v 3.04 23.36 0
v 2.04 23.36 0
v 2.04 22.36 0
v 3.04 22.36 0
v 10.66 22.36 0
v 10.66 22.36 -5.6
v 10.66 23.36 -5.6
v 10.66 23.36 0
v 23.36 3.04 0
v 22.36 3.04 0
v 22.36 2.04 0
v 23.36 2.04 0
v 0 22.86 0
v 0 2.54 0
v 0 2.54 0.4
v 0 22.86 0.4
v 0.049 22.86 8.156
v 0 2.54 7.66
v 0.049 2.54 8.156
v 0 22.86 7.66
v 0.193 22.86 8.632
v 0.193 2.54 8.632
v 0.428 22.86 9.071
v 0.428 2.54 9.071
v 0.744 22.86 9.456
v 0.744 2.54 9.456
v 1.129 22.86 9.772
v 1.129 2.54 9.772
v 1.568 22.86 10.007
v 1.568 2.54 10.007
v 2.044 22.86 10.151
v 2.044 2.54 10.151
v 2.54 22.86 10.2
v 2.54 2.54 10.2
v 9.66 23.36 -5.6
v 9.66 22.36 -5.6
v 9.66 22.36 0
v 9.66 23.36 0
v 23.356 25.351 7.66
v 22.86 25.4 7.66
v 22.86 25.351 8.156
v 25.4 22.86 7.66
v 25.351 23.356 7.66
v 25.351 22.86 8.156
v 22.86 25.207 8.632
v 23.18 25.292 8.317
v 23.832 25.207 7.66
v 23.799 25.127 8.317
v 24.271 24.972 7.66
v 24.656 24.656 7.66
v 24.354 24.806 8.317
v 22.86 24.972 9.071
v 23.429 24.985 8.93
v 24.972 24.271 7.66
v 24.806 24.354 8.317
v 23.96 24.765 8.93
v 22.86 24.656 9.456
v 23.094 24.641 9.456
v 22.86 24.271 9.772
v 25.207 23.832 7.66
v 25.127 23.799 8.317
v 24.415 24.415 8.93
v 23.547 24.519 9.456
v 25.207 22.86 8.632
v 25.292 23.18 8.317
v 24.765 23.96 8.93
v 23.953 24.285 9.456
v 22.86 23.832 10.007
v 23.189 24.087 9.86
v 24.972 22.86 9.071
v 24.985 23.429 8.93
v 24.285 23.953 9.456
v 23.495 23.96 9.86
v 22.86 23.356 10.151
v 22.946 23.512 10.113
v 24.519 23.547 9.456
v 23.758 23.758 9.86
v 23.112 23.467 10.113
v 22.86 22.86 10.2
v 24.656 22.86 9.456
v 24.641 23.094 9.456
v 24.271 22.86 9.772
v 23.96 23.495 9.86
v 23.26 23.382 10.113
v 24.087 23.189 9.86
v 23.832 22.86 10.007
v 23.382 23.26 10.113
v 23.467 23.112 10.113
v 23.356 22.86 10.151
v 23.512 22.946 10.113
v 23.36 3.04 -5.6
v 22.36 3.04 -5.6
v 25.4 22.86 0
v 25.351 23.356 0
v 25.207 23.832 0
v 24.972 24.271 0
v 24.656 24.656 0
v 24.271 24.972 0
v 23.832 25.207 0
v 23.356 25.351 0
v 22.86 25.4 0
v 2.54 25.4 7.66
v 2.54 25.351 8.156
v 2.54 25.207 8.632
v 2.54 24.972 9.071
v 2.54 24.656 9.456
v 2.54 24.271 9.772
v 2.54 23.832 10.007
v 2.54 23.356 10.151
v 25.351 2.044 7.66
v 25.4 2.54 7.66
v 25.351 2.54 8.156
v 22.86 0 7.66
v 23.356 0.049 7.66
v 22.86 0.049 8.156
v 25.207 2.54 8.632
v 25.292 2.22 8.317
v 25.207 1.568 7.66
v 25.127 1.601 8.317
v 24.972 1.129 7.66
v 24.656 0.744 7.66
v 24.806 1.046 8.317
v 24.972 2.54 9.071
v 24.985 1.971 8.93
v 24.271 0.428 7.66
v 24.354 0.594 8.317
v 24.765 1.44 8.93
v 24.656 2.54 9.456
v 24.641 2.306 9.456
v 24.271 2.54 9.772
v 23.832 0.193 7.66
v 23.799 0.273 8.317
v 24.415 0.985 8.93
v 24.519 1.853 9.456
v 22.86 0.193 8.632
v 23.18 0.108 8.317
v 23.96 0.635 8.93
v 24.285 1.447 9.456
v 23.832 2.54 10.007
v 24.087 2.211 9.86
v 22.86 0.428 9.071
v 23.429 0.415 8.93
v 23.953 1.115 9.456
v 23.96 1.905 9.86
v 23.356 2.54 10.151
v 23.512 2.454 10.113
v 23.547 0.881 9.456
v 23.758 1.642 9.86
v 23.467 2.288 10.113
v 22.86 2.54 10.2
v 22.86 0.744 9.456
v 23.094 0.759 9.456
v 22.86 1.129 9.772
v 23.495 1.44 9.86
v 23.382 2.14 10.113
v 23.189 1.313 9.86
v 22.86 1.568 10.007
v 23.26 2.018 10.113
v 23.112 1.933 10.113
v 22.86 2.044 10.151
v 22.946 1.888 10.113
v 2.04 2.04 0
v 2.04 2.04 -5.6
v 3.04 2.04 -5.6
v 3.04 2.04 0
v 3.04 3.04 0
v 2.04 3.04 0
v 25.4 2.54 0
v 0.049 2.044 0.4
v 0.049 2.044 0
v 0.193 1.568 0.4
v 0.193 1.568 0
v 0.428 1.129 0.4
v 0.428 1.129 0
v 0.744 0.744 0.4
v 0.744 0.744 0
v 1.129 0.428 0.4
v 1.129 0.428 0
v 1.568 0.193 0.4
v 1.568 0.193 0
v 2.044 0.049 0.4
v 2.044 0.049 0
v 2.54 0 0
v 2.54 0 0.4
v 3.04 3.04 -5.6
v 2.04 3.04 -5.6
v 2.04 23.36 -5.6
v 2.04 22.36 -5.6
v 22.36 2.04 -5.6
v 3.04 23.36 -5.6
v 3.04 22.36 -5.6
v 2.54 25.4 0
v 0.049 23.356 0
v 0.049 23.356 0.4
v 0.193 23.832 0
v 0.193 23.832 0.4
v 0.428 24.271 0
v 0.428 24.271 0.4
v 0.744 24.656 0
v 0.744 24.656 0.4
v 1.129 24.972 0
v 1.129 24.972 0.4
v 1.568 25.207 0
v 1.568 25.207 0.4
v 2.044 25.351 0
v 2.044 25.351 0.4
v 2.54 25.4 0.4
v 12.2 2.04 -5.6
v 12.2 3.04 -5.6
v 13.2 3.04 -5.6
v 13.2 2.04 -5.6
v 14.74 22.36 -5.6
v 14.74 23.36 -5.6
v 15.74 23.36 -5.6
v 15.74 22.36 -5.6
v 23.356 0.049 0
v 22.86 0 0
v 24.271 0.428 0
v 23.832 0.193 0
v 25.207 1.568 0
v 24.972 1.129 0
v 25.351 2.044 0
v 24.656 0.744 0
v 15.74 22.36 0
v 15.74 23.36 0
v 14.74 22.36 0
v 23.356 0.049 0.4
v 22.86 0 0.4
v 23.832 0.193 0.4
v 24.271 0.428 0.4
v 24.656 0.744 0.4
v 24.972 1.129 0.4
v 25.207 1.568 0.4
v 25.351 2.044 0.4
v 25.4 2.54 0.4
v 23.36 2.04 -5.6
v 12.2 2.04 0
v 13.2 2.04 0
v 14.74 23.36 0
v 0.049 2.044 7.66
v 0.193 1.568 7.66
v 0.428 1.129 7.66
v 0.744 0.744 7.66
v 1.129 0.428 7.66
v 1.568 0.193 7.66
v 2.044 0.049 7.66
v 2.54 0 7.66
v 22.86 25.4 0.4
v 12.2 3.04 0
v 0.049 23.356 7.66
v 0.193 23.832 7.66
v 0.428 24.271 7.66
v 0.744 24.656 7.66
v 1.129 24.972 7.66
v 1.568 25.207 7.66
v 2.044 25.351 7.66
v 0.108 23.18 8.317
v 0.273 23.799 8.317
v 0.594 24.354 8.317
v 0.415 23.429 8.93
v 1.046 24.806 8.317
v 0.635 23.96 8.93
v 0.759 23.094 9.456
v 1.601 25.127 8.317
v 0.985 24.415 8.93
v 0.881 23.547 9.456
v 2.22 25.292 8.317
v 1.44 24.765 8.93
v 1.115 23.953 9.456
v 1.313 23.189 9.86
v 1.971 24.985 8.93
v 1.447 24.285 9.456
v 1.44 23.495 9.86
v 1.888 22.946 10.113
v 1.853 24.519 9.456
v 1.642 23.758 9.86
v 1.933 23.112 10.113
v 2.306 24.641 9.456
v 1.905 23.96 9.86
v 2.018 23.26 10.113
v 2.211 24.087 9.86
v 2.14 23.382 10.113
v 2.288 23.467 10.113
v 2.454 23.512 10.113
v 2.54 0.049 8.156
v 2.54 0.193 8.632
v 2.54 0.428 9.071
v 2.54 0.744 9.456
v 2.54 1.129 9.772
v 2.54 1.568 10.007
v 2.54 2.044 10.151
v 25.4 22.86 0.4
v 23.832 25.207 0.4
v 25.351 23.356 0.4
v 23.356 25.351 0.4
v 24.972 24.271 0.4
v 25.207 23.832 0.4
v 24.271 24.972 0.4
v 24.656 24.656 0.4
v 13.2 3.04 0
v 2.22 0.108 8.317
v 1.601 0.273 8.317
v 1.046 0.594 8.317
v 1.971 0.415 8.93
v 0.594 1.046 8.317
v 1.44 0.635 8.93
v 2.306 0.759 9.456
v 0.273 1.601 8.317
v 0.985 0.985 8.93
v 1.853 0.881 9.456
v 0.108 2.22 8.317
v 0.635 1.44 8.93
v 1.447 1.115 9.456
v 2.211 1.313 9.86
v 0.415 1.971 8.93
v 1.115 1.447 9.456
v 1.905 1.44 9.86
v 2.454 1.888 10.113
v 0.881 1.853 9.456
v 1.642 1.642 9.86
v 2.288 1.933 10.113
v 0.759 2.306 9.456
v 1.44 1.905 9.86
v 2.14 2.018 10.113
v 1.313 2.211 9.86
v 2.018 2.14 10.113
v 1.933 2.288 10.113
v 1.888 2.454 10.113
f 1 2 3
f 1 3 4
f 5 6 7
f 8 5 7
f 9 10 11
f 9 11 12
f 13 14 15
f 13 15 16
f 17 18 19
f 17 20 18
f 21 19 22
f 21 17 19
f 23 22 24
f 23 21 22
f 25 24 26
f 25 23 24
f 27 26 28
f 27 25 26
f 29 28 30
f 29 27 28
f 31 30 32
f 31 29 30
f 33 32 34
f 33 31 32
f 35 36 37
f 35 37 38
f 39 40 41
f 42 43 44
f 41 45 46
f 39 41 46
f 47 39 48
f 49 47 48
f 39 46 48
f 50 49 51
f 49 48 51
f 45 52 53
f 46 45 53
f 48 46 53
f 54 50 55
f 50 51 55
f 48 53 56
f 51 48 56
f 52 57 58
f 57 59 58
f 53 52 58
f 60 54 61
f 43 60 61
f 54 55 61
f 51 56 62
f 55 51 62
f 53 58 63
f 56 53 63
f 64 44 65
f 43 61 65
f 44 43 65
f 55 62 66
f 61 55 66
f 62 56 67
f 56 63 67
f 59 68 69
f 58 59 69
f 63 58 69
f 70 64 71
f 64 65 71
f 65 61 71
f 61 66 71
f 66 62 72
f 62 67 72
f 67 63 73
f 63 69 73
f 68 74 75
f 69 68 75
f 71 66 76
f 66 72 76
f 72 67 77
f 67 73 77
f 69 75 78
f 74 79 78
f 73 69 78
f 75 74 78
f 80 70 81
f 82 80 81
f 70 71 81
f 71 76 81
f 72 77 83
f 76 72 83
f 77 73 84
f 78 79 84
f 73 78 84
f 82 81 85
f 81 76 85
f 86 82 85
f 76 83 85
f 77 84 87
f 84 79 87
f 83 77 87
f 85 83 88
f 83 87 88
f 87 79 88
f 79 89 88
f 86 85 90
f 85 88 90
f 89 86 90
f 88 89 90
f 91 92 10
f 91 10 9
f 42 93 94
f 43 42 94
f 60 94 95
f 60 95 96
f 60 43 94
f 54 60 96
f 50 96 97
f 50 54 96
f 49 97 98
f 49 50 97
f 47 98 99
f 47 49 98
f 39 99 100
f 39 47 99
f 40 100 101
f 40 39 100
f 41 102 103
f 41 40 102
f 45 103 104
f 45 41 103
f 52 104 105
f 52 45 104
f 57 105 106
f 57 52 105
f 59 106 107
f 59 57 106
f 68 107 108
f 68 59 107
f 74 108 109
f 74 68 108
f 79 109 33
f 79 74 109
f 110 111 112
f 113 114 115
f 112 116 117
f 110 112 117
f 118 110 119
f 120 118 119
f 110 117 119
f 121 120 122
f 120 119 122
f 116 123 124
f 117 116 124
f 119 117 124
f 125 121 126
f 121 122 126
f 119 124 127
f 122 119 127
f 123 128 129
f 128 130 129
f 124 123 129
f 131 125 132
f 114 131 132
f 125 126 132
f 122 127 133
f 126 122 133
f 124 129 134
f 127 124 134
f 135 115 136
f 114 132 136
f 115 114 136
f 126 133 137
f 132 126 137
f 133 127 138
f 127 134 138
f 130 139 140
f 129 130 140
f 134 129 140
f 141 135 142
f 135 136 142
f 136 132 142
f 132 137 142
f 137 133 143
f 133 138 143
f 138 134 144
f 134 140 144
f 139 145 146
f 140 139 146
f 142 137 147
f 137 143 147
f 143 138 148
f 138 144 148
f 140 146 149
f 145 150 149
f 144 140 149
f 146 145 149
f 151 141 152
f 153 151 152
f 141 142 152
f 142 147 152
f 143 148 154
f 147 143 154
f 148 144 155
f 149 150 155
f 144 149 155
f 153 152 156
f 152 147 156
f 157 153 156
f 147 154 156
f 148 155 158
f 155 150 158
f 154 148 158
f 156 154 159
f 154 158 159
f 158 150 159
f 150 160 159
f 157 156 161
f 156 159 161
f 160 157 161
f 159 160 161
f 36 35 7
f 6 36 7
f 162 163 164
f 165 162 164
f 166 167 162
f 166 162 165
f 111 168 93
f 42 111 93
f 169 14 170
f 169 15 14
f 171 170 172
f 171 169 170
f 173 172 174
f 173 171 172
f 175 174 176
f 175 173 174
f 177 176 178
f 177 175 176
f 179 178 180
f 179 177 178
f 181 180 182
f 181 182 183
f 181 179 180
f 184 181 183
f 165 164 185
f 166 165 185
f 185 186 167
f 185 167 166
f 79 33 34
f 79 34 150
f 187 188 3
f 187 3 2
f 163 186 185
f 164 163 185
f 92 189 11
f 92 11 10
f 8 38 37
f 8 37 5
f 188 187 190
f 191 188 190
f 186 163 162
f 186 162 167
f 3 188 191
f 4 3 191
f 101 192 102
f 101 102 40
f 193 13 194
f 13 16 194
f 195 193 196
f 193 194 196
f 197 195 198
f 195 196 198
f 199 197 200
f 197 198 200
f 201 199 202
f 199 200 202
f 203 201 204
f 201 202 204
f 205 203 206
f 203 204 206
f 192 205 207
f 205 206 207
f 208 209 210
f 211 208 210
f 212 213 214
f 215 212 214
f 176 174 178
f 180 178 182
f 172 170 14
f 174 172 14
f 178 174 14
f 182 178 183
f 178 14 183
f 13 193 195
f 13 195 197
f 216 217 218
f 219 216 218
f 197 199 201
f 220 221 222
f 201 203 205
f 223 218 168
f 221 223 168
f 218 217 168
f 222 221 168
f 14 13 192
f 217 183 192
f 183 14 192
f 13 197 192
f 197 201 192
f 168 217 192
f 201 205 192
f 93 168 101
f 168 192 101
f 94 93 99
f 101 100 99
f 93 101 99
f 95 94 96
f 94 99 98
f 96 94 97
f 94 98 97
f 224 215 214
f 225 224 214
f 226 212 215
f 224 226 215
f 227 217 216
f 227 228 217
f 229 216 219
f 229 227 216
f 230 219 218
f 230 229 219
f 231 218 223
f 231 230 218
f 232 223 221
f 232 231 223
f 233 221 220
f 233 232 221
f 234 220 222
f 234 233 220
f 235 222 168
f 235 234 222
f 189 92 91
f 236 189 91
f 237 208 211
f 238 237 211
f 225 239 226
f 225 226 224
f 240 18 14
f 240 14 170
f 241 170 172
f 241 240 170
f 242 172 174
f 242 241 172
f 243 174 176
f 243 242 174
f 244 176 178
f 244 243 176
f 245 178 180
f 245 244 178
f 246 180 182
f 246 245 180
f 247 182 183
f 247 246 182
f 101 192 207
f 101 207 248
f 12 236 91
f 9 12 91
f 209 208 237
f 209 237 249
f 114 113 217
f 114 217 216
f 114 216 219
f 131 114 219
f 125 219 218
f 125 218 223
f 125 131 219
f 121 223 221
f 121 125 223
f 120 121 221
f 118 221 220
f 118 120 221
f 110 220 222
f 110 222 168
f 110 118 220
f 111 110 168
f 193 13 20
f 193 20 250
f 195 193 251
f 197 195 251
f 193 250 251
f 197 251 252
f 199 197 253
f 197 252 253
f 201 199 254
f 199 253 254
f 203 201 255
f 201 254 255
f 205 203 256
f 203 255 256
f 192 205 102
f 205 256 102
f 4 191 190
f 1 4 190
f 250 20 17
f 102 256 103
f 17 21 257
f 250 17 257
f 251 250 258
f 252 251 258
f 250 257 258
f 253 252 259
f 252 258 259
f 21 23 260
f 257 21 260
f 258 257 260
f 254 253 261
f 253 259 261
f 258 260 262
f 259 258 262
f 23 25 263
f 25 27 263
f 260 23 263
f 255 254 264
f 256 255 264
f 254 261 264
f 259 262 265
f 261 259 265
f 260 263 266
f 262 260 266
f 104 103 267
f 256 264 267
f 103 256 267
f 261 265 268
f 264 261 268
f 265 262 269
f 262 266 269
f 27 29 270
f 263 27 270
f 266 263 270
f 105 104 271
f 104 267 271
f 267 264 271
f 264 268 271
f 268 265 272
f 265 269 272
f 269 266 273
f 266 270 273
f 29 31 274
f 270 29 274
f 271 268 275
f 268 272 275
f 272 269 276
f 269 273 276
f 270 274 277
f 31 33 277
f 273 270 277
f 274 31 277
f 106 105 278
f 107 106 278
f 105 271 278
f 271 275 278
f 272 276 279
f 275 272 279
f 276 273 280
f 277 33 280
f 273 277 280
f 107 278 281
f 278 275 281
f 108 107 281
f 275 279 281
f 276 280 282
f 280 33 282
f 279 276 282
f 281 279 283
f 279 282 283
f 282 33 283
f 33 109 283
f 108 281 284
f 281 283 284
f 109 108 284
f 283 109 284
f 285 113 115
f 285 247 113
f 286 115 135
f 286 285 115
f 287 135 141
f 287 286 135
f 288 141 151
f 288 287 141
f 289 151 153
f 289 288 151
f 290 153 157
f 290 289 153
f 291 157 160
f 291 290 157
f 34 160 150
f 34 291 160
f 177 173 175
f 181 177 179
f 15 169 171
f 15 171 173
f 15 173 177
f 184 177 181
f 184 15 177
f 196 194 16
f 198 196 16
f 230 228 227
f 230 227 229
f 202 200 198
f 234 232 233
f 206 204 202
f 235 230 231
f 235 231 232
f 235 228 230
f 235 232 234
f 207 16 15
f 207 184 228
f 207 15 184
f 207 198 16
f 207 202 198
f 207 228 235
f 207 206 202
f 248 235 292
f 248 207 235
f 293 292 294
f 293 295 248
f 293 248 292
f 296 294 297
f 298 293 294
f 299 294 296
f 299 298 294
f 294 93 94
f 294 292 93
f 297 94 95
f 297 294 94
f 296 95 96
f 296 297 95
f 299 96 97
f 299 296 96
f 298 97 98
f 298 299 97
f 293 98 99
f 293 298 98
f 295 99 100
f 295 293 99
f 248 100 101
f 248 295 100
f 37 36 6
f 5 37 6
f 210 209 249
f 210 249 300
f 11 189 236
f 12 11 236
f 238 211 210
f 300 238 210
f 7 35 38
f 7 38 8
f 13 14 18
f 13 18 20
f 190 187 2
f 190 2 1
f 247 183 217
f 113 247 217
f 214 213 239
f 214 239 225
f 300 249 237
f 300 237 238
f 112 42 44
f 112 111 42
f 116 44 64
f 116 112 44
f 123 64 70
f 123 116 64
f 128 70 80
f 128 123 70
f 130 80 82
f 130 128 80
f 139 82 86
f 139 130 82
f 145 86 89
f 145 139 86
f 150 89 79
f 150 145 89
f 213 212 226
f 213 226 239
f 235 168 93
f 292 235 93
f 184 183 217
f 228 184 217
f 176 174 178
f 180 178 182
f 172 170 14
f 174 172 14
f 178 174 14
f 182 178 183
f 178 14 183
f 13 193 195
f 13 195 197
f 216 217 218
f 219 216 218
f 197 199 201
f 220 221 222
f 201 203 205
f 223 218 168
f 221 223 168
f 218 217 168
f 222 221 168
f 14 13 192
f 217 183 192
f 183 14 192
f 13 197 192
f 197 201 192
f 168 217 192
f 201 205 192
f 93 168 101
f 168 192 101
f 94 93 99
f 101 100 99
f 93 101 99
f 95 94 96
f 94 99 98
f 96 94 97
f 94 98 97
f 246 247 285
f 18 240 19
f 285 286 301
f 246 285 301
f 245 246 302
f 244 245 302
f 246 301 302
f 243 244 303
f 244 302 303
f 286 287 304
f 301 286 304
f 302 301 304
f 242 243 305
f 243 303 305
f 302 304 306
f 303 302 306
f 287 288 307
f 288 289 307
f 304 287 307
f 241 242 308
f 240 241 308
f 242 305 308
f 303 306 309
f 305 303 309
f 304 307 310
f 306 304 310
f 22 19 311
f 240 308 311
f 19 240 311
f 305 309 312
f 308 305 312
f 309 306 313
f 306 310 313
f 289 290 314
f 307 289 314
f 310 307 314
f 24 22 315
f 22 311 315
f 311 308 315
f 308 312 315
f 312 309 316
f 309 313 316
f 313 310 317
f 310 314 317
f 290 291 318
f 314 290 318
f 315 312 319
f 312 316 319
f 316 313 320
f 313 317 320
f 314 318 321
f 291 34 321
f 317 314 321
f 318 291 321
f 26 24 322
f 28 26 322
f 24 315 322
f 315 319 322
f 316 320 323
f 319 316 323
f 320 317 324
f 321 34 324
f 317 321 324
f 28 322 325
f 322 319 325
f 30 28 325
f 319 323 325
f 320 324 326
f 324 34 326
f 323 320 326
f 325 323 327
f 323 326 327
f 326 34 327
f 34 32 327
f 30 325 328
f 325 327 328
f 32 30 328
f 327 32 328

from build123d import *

# Parameters (mm, degrees)
BOX_W        = 25.4
BOX_H        = 25.4
BOX_DEPTH    = 0.4
FILLET_R     = 2.54
BOX002_W     = 1
BOX002_H     = 1
BOX002_DEPTH = 5.6
BOX006_W     = 1
BOX006_H     = 1
BOX006_DEPTH = 5.6
BOX005_W     = 1
BOX005_H     = 1
BOX005_DEPTH = 5.6
BOX004_W     = 1
BOX004_H     = 1
BOX004_DEPTH = 5.6
BOX003_W     = 1
BOX003_H     = 1
BOX003_DEPTH = 5.6
BOX001_W     = 1
BOX001_H     = 1
BOX001_DEPTH = 5.6
BOX007_W     = 25.4
BOX007_H     = 25.4
BOX007_DEPTH = 10.2
FILLET002_R  = 2.54
FILLET003_R  = 2.54


with BuildPart() as bottomplastic:
    # Box → Box (new body)
    with BuildSketch(Plane.XY):
        with Locations((12.7, 12.7)):
            Rectangle(BOX_W, BOX_H)
    extrude(amount=BOX_DEPTH)

    # Fillet
    fillet_edges = [bottomplastic.edges().sort_by_distance(p)[0] for p in [
        (0, 0, 0.2),
        (0, 25.4, 0.2),
        (25.4, 0, 0.2),
        (25.4, 25.4, 0.2),
    ]]
    fillet(fillet_edges, radius=FILLET_R)


with BuildPart() as pin4:
    # Box002 → Box002 (new body)
    with BuildSketch(Plane(origin=(12.2, 2.04, -5.6), x_dir=(1, 0, 0), z_dir=(0, 0, 1))):
        with Locations((0.5, 0.5)):
            Rectangle(BOX002_W, BOX002_H)
    extrude(amount=BOX002_DEPTH)


with BuildPart() as pin1:
    # Box006 → Box006 (new body)
    with BuildSketch(Plane(origin=(14.74, 22.36, -5.6), x_dir=(1, 0, 0), z_dir=(0, 0, 1))):
        with Locations((0.5, 0.5)):
            Rectangle(BOX006_W, BOX006_H)
    extrude(amount=BOX006_DEPTH)


with BuildPart() as pin2:
    # Box005 → Box005 (new body)
    with BuildSketch(Plane(origin=(9.66, 22.36, -5.6), x_dir=(1, 0, 0), z_dir=(0, 0, 1))):
        with Locations((0.5, 0.5)):
            Rectangle(BOX005_W, BOX005_H)
    extrude(amount=BOX005_DEPTH)


with BuildPart() as pin6:
    # Box004 → Box004 (new body)
    with BuildSketch(Plane(origin=(2.04, 22.36, -5.6), x_dir=(1, 0, 0), z_dir=(0, 0, 1))):
        with Locations((0.5, 0.5)):
            Rectangle(BOX004_W, BOX004_H)
    extrude(amount=BOX004_DEPTH)


with BuildPart() as pin5:
    # Box003 → Box003 (new body)
    with BuildSketch(Plane(origin=(22.36, 2.04, -5.6), x_dir=(1, 0, 0), z_dir=(0, 0, 1))):
        with Locations((0.5, 0.5)):
            Rectangle(BOX003_W, BOX003_H)
    extrude(amount=BOX003_DEPTH)


with BuildPart() as pins:
    # Box001 → Box001 (new body)
    with BuildSketch(Plane(origin=(2.04, 2.04, -5.6), x_dir=(1, 0, 0), z_dir=(0, 0, 1))):
        with Locations((0.5, 0.5)):
            Rectangle(BOX001_W, BOX001_H)
    extrude(amount=BOX001_DEPTH)

    # Fusion: union Pin4, Pin1, Pin2, Pin6, Pin5
    add(pin4.part)
    add(pin1.part)
    add(pin2.part)
    add(pin6.part)
    add(pin5.part)


with BuildPart() as topplastic:
    # Box007 → Box007 (new body)
    with BuildSketch(Plane.XY):
        with Locations((12.7, 12.7)):
            Rectangle(BOX007_W, BOX007_H)
    extrude(amount=BOX007_DEPTH)

    # Fillet002
    fillet002_edges = [topplastic.edges().sort_by_distance(p)[0] for p in [
        (0, 0, 5.1),
        (0, 25.4, 5.1),
        (25.4, 0, 5.1),
        (25.4, 25.4, 5.1),
    ]]
    fillet(fillet002_edges, radius=FILLET002_R)

    # Fillet003
    fillet003_edges = [topplastic.edges().sort_by_distance(p)[0] for p in [
        (0, 12.7, 10.2),
        (0.743949, 0.743949, 10.2),
        (0.743949, 24.656051, 10.2),
        (12.7, 0, 10.2),
        (12.7, 25.4, 10.2),
        (24.656051, 0.743949, 10.2),
        (24.656051, 24.656051, 10.2),
        (25.4, 12.7, 10.2),
    ]]
    fillet(fillet003_edges, radius=FILLET003_R)


solid = Compound([bottomplastic.part, pins.part, topplastic.part])
